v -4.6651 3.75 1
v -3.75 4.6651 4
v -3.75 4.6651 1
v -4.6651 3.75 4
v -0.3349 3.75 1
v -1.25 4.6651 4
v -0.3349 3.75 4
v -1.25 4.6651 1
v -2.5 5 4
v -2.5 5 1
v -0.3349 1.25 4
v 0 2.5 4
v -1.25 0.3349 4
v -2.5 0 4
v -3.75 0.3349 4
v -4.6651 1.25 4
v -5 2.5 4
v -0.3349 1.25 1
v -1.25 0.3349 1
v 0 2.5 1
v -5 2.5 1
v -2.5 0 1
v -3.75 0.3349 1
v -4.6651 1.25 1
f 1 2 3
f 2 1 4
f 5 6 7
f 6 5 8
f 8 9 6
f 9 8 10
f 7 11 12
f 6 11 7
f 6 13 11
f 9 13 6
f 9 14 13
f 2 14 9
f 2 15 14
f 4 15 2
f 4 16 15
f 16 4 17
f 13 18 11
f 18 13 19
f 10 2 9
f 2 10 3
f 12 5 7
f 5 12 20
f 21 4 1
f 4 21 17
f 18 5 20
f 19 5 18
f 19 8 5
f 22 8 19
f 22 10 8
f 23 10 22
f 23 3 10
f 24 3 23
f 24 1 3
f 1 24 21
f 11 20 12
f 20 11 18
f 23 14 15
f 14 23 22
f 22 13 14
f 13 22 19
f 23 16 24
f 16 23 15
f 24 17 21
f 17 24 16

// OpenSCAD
// plate 2x2 bow

// external vars #########################

ext_scale = 1.0;

// internal vars #########################

pts_base = [[0,-5],[2,-5],[4,-2.5],[4,2.5],[2,5],[0,5]];

base_r = (sqrt(26)/2)/(1/sqrt(26));
base_ang_z = base_r-1;
top_r = (sqrt(34)/2)/(3/sqrt(34));
top_ang_z = top_r-3;
side_r = (sqrt(25+2.5*2.5)/2)/(2.5/sqrt(25+2.5*2.5));
side_ang_z = side_r-2.5;

pts_bow = [
// base 0,1,2,3,4
[-5,0,0],[-5,5,0],[-5,5,2],[-5,2.5,4],[-5,0,4],
// bloc 5,6,7,8,9
[0,0,0],[0,5,0],[0,5,2],[0,2.5,4],[0,0,4]/*,
// first step 10,11,12,13,14
[1.25,0,0],[1.25,5,0],
[1.25,5,1+sqrt(base_r*base_r-1.25*1.25)-base_ang_z],
[1.25,2.5+side_r-sqrt(side_r*side_r-1.25*1.25),1+sqrt(top_r*top_r-1.25*1.25)-top_ang_z],
[1.25,0,1+sqrt(top_r*top_r-1.25*1.25)-top_ang_z],
// second step 15,16,17,18,19
[2.5,0,0],[2.5,5,0],
[2.5,5,1+sqrt(base_r*base_r-2.5*2.5)-base_ang_z],
[2.5,2.5+side_r-sqrt(side_r*side_r-2.5*2.5),1+sqrt(top_r*top_r-2.5*2.5)-top_ang_z],
[2.5,0,1+sqrt(top_r*top_r-2.5*2.5)-top_ang_z],
// third step 20,21,22,23,24
[3.75,0,0],[3.75,5,0],
[3.75,5,1+sqrt(base_r*base_r-3.75*3.75)-base_ang_z],
[3.75,2.5+side_r-sqrt(side_r*side_r-3.75*3.75),1+sqrt(top_r*top_r-3.75*3.75)-top_ang_z],
[3.75,0,1+sqrt(top_r*top_r-3.75*3.75)-top_ang_z],
// end 25,26,27,28
[5,0,0],[5,5,0],[5,5,1],[5,0,1]
*/
];

fc_bow = [
// base
[0,1,2,3,4],
//bloc
[0,1,6,5],
//[1,6,7,2],
//[2,7,8,3],
//[3,8,9,4],[0,4,9,5],
//
[5,9,8,7,6]
//
/*
//first step
[0,1,6,5],[1,2,7,6],
[2,3,8],[2,8,7],
[3,4,9,8],[0,4,9,5],
// second step
[5,6,11,10],[6,7,12,11],
[7,8,13],[7,13,12],
[8,9,14,13],[5,9,14,10],
// third step
[10,11,16,15],[11,12,17,16],
[12,13,18],[12,18,17],
[13,14,19,18],[10,14,19,15],
// last step
[15,16,21,20],[16,17,22,21],[17,18,22],[18,19,23,22],[15,19,23,20],
// end
[20,21,22,23]
*/
];

// part ##################################

scale([ext_scale,ext_scale,ext_scale])
union() {
  polyhedron(points=pts_bow,faces=fc_bow);
  //mirror([0,1,0]) polyhedron(points=pts_bow,faces=fc_bow);
  //rotate([0,-90,0]) linear_extrude(height=5) polygon(pts_base);
  //translate([-2.5,-2.5,1]) cylinder(h=3,d=5,center=false,$fn=12);
  translate([-2.5,2.5,1]) cylinder(h=3,d=5,center=false,$fn=12);
}
